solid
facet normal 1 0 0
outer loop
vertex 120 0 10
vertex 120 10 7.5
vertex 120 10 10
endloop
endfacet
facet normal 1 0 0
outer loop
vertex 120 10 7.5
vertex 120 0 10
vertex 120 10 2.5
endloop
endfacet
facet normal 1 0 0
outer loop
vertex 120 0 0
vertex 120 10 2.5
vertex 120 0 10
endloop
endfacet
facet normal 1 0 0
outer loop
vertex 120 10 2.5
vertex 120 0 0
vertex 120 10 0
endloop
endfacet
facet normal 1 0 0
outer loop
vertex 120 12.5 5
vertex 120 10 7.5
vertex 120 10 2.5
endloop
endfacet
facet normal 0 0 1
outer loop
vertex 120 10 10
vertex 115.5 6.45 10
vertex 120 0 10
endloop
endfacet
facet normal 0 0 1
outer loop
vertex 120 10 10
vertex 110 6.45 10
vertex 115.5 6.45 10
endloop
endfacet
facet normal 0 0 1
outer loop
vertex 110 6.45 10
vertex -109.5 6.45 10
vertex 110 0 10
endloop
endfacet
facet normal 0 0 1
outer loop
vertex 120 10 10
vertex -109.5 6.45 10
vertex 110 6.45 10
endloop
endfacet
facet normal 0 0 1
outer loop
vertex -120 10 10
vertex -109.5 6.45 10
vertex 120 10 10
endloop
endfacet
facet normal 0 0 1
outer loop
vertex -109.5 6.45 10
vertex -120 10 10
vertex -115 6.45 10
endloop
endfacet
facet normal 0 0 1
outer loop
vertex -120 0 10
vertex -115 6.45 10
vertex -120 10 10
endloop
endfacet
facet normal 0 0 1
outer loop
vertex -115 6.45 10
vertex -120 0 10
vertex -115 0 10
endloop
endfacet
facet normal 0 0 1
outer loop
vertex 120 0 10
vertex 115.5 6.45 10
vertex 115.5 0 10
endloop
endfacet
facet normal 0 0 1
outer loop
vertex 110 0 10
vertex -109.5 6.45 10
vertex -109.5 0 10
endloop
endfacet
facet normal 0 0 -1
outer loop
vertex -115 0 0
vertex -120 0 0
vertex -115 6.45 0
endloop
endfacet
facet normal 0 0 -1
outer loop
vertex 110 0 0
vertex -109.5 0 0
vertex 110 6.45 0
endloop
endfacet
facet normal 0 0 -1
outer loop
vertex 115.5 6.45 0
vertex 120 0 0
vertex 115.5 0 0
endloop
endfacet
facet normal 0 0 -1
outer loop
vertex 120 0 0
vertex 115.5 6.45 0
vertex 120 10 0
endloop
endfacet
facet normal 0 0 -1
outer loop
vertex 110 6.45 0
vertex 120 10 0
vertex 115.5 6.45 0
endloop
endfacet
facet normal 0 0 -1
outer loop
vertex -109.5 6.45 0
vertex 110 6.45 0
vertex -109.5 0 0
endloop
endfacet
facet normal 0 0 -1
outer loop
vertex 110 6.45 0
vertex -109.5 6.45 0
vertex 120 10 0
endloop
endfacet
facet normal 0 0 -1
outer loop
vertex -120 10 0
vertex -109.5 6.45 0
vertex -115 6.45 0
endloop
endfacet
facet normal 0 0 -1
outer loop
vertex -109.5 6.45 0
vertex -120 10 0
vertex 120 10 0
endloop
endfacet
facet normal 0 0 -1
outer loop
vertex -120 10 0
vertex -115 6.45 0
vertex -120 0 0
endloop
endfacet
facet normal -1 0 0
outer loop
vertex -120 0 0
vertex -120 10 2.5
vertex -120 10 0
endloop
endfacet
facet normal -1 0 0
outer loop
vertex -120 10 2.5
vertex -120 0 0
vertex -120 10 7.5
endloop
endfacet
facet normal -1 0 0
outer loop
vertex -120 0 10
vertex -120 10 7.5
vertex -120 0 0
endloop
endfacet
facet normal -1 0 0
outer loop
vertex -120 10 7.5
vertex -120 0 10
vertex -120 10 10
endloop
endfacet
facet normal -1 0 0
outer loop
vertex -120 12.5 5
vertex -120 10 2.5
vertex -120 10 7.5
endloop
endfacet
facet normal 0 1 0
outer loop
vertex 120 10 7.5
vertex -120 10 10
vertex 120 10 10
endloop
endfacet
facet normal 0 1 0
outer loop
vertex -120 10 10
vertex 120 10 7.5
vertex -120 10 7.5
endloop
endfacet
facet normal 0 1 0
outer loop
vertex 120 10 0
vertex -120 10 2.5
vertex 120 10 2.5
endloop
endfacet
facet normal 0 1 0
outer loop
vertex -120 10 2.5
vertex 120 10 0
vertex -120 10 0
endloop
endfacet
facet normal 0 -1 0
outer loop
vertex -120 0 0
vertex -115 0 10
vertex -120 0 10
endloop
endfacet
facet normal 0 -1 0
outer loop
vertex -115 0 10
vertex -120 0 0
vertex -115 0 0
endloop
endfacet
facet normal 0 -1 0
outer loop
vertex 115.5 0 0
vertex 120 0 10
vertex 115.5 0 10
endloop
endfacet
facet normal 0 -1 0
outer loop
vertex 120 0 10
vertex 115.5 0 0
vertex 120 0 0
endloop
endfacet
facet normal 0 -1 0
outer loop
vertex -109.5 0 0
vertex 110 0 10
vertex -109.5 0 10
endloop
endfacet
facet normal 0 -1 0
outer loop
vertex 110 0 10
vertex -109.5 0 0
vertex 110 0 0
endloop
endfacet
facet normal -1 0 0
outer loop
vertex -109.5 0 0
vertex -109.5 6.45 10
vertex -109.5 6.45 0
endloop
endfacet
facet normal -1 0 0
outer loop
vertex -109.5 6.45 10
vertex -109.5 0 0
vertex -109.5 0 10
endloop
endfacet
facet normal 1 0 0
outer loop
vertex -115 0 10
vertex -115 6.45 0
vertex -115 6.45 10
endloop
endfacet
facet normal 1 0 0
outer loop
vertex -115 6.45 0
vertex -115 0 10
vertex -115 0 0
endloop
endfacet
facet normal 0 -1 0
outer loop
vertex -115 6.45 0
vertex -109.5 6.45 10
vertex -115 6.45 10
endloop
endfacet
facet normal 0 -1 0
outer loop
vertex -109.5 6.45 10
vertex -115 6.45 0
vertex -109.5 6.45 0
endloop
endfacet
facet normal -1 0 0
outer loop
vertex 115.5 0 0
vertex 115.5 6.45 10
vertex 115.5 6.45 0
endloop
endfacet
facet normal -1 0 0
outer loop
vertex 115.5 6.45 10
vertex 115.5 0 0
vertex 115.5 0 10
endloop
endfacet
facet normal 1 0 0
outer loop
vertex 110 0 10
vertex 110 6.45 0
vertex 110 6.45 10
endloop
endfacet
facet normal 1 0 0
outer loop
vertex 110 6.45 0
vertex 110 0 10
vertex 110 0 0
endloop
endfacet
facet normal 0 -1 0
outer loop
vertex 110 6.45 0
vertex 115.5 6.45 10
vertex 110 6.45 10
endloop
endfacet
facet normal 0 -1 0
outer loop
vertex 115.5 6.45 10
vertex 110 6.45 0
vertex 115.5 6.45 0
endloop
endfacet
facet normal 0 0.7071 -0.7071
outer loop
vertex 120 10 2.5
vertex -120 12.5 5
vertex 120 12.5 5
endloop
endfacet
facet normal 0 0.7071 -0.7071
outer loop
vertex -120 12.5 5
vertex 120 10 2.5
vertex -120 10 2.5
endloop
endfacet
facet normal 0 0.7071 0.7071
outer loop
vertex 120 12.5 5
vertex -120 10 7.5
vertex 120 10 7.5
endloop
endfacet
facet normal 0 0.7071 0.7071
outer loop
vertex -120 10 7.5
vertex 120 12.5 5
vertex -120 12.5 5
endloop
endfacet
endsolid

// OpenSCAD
// file: clip.scad
EPSILON=.05;
TOLERANCE=.5;

bagW=140;
slotO=5;
slotW=5;
slotD=6;
slotAssemblyW=2*slotO*slotW;

clipW=2*slotAssemblyW + bagW;
clipD=10;
clipH=10;

notchOpening=5;
notchOpeningH=clipH - 2*notchOpening;
notchSide=sqrt(notchOpening*notchOpening/2);

gapD=2;

lockW=slotW - TOLERANCE;
lockD=2*clipD+gapD;
lockH=2*clipH;
lockHoleD=2*(clipD-slotD)+gapD+EPSILON+TOLERANCE;

module slot(eps, tol) {
    translate([-slotW/2,
               -slotD/2,
               -eps])
        cube([slotW+tol, 
              slotD+tol, 
              clipH+2*eps]);
}

module unnotched() {
    difference() {
        translate([-clipW/2, 0, 0]) {
            cube([clipW, clipD, clipH]);
        }
        translate([-(clipW/2-slotW/2-slotO), slotD/2-EPSILON, 0]) {
            slot(eps=EPSILON, tol=TOLERANCE);
        }
        translate([(clipW/2-slotW/2-slotO), slotD/2-EPSILON, 0]) {
            slot(eps=EPSILON, tol=TOLERANCE);
        }
    }
}

module notch(eps=EPSILON) {
    translate([0, clipD, clipH/2]) {
        rotate([45, 0, 0]) {
            cube([clipW+eps, notchSide, notchSide], center=true);
        }
    }
}

module negative() {
    difference() {
        unnotched();
        notch();
    }
}

module positive() {
    union() {
        unnotched();
        notch(eps=0);
    }
}

module lock() {
    difference() {
        cube([lockW, lockD, lockH]);
        translate([-EPSILON, (lockD-lockHoleD)/2, -EPSILON]) {
            cube([lockW+2*EPSILON,
                  lockHoleD,
                  clipH+EPSILON]);
        }
    }
}

previewGapD=gapD/2;

npreviewX=0;
npreviewY=-clipD-previewGapD;
npreviewZ=0;

ppreviewX=0;
ppreviewY=clipD+previewGapD;
ppreviewZ=0;

lpreviewX=-clipW/2+slotO;
lpreviewY=-(clipD + gapD/2);
lpreviewZ=1.1*clipH+EPSILON;

if ($preview) {
    translate([npreviewX, npreviewY, npreviewZ]) {
        negative();
    }
    translate([ppreviewX, ppreviewY, ppreviewZ]) {
        translate([0, 0, clipH]) {
            rotate([180, 0, 0]) {
                positive();
            }
        }
    }
    translate([lpreviewX, lpreviewY, lpreviewZ]) {
        lock();
    }
}

//
// This program is free software: you can redistribute it and/or modify it 
// under the terms of the GNU General Public License as published by the 
// Free Software Foundation, either version 3 of the License, or (at your option) any later version.
//
// This program is distributed in the hope that it will be useful, but 
// WITHOUT ANY WARRANTY; without even the implied warranty of 
// MERCHANTABILITY or FITNESS FOR A PARTICULAR PURPOSE. 
// See the GNU General Public License for more details.
//
// You should have received a copy of the GNU General Public License 
// along with this program. If not, see <https://www.gnu.org/licenses/>.
//
// main file
include <clip.scad>

positive();

//
// This program is free software: you can redistribute it and/or modify it 
// under the terms of the GNU General Public License as published by the 
// Free Software Foundation, either version 3 of the License, or (at your option) any later version.
//
// This program is distributed in the hope that it will be useful, but 
// WITHOUT ANY WARRANTY; without even the implied warranty of 
// MERCHANTABILITY or FITNESS FOR A PARTICULAR PURPOSE. 
// See the GNU General Public License for more details.
//
// You should have received a copy of the GNU General Public License 
// along with this program. If not, see <https://www.gnu.org/licenses/>.
//
